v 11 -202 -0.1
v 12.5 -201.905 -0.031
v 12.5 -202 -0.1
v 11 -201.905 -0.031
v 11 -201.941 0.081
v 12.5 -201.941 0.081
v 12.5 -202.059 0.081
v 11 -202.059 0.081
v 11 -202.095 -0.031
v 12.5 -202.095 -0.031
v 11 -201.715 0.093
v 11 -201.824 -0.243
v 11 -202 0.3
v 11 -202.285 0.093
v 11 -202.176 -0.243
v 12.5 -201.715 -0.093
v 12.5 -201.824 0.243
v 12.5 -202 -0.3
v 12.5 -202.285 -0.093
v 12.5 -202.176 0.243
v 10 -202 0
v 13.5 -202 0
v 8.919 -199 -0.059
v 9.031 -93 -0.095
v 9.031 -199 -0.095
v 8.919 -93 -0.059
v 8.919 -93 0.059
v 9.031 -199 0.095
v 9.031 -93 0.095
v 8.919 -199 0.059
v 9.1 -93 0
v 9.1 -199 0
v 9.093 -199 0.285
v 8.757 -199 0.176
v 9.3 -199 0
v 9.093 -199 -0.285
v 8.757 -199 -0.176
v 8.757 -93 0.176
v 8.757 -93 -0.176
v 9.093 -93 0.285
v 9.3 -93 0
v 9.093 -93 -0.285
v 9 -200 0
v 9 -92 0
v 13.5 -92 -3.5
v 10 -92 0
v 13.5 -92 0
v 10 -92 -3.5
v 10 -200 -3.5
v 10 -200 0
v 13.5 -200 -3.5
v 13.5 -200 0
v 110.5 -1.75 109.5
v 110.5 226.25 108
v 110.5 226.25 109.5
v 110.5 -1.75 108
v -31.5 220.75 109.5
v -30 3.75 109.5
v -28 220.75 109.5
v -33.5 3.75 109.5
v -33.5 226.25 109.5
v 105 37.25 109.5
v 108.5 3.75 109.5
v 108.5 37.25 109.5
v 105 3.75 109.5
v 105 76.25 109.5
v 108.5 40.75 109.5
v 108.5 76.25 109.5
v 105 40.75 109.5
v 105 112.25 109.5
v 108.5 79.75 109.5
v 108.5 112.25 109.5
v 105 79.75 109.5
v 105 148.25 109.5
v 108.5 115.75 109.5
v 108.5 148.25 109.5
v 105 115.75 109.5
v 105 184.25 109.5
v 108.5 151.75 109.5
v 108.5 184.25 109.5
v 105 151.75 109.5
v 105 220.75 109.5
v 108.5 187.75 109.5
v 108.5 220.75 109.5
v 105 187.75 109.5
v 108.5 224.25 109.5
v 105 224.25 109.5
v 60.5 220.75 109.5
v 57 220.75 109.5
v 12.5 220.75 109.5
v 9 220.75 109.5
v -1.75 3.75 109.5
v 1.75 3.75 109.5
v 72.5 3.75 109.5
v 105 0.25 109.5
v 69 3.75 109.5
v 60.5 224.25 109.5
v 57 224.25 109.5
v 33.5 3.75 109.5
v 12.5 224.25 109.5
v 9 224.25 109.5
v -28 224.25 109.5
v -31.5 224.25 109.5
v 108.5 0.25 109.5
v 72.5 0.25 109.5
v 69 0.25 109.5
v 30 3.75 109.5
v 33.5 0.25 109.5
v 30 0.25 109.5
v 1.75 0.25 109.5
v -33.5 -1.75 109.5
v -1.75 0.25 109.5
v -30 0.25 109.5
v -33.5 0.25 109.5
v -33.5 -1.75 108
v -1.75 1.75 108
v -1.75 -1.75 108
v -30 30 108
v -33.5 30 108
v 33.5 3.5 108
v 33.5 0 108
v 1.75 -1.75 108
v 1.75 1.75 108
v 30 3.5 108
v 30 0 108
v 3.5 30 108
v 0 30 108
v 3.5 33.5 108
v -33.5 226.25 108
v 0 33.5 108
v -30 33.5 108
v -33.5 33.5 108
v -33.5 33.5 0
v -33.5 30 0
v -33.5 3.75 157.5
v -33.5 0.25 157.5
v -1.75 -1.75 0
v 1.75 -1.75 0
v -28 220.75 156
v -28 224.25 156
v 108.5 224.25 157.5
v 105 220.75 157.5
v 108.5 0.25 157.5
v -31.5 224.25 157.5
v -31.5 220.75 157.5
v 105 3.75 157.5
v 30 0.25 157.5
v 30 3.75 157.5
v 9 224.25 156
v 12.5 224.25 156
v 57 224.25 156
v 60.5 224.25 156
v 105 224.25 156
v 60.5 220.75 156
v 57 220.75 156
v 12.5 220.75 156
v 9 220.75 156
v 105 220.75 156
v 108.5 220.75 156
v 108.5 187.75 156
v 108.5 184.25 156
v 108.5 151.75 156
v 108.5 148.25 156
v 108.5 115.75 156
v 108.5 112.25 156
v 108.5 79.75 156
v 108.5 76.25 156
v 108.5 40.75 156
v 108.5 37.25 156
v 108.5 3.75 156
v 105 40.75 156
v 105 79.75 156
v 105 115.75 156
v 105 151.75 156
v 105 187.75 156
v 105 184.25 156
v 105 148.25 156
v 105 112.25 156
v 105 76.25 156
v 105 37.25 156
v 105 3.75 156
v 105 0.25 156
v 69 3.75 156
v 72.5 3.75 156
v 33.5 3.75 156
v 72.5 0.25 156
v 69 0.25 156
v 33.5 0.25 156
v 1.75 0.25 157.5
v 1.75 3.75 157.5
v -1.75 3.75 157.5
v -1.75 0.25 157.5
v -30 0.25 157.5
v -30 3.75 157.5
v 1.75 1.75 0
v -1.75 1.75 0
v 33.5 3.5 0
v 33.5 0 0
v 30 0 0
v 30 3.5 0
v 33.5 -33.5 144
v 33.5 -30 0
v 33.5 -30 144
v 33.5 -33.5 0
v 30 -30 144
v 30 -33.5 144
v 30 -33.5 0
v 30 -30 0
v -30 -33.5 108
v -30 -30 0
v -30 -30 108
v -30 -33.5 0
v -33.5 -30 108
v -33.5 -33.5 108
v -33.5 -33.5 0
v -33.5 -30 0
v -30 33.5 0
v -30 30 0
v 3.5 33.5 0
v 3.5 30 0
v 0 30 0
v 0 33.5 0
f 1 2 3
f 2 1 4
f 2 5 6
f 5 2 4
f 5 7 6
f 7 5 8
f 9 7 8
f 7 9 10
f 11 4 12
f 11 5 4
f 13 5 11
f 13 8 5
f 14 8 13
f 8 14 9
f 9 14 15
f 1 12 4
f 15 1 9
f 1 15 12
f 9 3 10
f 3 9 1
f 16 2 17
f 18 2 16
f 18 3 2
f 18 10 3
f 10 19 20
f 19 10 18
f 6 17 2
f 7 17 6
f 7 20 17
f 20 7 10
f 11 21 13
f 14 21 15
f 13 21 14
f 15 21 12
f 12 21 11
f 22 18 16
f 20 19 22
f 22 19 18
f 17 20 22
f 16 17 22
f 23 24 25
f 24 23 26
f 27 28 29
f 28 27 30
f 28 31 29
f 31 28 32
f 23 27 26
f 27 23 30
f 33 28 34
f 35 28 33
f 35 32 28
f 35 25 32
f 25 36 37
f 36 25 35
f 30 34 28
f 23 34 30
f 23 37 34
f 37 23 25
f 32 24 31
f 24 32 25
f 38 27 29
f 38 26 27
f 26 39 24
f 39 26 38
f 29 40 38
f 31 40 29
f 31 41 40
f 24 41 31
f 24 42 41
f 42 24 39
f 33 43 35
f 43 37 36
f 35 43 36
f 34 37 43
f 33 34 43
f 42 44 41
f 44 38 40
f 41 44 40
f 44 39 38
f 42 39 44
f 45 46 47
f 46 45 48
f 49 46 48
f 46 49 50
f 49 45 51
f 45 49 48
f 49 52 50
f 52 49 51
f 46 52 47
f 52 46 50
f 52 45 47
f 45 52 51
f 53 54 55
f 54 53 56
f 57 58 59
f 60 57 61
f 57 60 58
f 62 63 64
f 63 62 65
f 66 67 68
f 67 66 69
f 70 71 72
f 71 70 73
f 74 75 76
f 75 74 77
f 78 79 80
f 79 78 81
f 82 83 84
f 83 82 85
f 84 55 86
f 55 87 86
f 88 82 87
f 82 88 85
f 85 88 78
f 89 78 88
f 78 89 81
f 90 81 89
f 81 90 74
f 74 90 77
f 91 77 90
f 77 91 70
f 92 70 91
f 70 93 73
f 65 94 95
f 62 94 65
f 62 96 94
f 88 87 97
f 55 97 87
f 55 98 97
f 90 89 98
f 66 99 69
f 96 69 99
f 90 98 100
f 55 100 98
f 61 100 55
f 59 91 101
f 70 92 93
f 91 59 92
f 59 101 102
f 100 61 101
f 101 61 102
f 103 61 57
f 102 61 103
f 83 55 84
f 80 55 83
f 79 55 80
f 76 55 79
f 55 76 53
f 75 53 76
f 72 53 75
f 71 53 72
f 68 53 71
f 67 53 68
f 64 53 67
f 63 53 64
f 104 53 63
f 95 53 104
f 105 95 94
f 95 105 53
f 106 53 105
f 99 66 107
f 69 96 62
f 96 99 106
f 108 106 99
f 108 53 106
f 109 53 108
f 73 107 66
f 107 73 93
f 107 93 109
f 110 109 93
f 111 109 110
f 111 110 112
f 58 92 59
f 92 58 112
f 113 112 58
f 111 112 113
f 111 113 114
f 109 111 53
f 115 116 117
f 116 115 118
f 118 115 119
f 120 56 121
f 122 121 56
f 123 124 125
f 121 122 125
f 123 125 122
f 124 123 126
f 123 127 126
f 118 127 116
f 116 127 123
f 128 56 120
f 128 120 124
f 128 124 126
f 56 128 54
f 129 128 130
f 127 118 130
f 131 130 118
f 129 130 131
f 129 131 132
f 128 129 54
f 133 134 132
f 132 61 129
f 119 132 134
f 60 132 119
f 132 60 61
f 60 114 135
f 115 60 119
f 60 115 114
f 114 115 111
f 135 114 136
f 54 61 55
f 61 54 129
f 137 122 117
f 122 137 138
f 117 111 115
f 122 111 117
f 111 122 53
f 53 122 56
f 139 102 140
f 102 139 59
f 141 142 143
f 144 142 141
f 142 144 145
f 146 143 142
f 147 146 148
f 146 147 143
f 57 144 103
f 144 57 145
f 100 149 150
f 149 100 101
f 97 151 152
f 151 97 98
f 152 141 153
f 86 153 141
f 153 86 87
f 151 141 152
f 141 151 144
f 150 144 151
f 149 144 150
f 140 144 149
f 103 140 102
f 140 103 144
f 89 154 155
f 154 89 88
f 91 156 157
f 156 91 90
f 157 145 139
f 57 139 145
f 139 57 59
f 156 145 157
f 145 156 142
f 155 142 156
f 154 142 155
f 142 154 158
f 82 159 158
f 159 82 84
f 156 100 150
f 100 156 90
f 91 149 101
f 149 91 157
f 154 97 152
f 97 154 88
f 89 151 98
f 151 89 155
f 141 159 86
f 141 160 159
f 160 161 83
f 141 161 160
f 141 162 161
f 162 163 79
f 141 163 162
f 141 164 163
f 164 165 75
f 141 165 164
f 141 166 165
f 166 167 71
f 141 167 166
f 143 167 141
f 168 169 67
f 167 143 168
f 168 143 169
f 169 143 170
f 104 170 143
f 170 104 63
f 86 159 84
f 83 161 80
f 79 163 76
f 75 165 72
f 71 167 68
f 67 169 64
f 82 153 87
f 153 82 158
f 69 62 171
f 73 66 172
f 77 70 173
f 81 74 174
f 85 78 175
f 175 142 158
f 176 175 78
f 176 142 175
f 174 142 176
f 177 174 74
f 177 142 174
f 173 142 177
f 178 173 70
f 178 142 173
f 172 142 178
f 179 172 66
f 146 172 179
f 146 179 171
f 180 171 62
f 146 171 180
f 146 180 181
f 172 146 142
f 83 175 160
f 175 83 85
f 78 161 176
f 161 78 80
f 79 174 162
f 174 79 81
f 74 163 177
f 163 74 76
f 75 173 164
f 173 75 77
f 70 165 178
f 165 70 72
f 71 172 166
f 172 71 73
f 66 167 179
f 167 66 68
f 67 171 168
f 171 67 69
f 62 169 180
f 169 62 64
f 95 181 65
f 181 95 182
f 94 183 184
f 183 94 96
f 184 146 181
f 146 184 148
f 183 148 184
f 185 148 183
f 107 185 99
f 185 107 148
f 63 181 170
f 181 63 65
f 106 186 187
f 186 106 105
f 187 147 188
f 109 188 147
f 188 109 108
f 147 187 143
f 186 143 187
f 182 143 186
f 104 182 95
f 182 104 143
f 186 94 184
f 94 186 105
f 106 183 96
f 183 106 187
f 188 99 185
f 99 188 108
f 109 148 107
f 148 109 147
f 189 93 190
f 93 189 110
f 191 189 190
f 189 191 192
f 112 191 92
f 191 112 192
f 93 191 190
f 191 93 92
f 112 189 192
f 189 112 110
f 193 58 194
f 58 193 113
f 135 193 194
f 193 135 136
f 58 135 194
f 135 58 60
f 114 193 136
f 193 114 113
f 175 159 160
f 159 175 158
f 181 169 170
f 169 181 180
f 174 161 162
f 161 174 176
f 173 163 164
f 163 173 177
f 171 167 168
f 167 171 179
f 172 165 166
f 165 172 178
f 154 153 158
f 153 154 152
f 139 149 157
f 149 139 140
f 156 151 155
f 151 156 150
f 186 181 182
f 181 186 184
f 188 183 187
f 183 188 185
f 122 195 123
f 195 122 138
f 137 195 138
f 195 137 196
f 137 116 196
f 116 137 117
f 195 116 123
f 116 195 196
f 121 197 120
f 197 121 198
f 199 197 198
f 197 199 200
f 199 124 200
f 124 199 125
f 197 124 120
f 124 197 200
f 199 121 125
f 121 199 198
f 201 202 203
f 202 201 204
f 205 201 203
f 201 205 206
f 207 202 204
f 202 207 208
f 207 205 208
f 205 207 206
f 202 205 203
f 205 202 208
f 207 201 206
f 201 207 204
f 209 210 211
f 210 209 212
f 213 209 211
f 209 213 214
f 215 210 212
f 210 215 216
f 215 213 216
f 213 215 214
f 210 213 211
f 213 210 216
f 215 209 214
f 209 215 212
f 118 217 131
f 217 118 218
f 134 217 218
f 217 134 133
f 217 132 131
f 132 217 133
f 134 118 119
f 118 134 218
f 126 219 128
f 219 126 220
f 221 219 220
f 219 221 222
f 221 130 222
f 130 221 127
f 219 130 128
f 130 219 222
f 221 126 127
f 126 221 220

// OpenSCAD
// file: ../lib/common.scad
//--------------------------------------------------------------------------------------------------
// Module Prism
//--------------------------------------------------------------------------------------------------
module prism(z, y, x)
{
    rotate([0, 90, 0])
    {
        polyhedron(
                points=[[0,0,0], [x,0,0], [x,y,0], [0,y,0], [0,y,z], [x,y,z]],
                faces=[[0,1,2,3],[5,4,3,2],[0,4,5,1],[0,3,4],[5,2,1]]);
    }
}

//--------------------------------------------------------------------------------------------------
// Module Side panel
//--------------------------------------------------------------------------------------------------
module rect_cut(x, y, z, dx, dy)
{
    // Top panel
    translate([0, dy, 0])
    {
        cube([x, y - dy, z]);
    };

    // Left bottom panel
    translate([0, 0, 0])
    {
        cube([dx, dy, z]);
    };

    // Triangle
    translate([dx, 0, 0])
    {
        rotate([0, 0, 0])
        {
            prism(x - dx, dy, -z);
        }
    };
}

//--------------------------------------------------------------------------------------------------
// X dimensional arrow
//--------------------------------------------------------------------------------------------------
module arrow_x(l)
{
    line_w = 0.1;
    arrow_w = 1;
    arrow_h = 0.3;

    // Line
    translate([l / 2, 0, 0])
    {
        rotate([0, 90, 0])
        {
            color([0.4, 0.4, 0.4])
            cylinder(l - arrow_w * 2, line_w, line_w, true);
        }
    }

    // Left arrow
    translate([arrow_w, 0, 0])
    {
        rotate([0, 270, 0])
        {
            color([0.4, 0.4, 0.4])
            cylinder(arrow_w, arrow_h, 0, false);
        }
    }

    // Right arrow
    translate([l - arrow_w, 0, 0])
    {
        rotate([0, 90, 0])
        {
            color([0.4, 0.4, 0.4])
            cylinder(arrow_w, arrow_h, 0, false);
        }
    }

    // Text
    translate([l/3, 0.5, 0])
    {
        color([0.4, 0.4, 0.4])
        text(str(l), size=1);
    }
}

//--------------------------------------------------------------------------------------------------
// Y dimensional arrow
//--------------------------------------------------------------------------------------------------
module arrow_y(l)
{
    line_w = 0.1;
    arrow_w = 1;
    arrow_h = 0.3;

    // Line
    translate([0, l / 2, 0])
    {
        rotate([90, 0, 00])
        {
            color([0.4, 0.4, 0.4])
            cylinder(l - arrow_w * 2, line_w, line_w, true);
        }
    }

    // Left arrow
    translate([0 ,arrow_w, 0])
    {
        rotate([90, 0, 0])
        {
            color([0.4, 0.4, 0.4])
            cylinder(arrow_w, arrow_h, 0, false);
        }
    }

    // Right arrow
    translate([0, l - arrow_w, 0])
    {
        rotate([270, 0, 0])
        {
            color([0.4, 0.4, 0.4])
            cylinder(arrow_w, arrow_h, 0, false);
        }
    }

    // Text
    translate([-0.5, l/3, 0])
    {
        rotate([0 ,0, 90])
        {
            color([0.4, 0.4, 0.4])
            text(str(l), size=1);
        }
    }
}

//--------------------------------------------------------------------------------------------------
// Z dimensional arrow
//--------------------------------------------------------------------------------------------------
module arrow_z(l)
{
    line_w = 0.11;
    arrow_w = 1;
    arrow_h = 0.3;

    // Line
    translate([0, 0, l / 2])
    {
        rotate([0, 0, 0])
        {
            color([0.4, 0.4, 0.4])
            cylinder(l - arrow_w * 2, line_w, line_w, true);
        }
    }

    // Left arrow
    translate([0, 0, arrow_w])
    {
        rotate([0, 180, 0])
        {
            color([0.4, 0.4, 0.4])
            cylinder(arrow_w, arrow_h, 0, false);
        }
    }

    // Right arrow
    translate([0, 0, l - arrow_w])
    {
        rotate([0, 0, 0])
        {
            color([0.4, 0.4, 0.4])
            cylinder(arrow_w, arrow_h, 0, false);
        }
    }

    // Text
    translate([0.5, 0, l/3])
    {
        rotate([90 ,0, 90])
        {
            color([0.4, 0.4, 0.4])
            text(str(l), size=1);
        }
    }
}

//--------------------------------------------------------------------------------------------------
// parallelogram
//--------------------------------------------------------------------------------------------------
module parallelogram(x = 12, y = 12, z = 1, xd = 0)
{
    points = [
        [0, 0, 0 ],        //0
        [x, 0, 0 ],        //1
        [x + xd, y, 0],    //2
        [xd, y, 0 ],       //3
        [0, 0, z ],        //4
        [x, 0, z ],        //5
        [x + xd, y, z ],   //6
        [xd, y, z ]];      //7

    faces = [
        [0,1,2,3],         // bottom
        [4,5,1,0],         // front
        [7,6,5,4],         // top
        [5,6,2,1],         // right
        [6,7,3,2],         // back
        [7,4,0,3]];        // left

    polyhedron(points, faces);
}

//--------------------------------------------------------------------------------------------------
// common board
//--------------------------------------------------------------------------------------------------
module board(w, h, d, r, g, b)
{
    color([r, g, b])
    cube([w, h, d]);
}

//--------------------------------------------------------------------------------------------------
// board dimension
//--------------------------------------------------------------------------------------------------
module dimension(w, h, d, r, g, b, part_x, part_y)
{
    translate([part_x, -part_y, 0])
    {
        rotate([-90, 0, 0])
        {
            board(w, h, d, r, g, b);
        }
            
        translate([0, -2, 0])
        {
            color([0, 0, 0])
            arrow_x(w);
        };

        translate([-1, 0, 0])
        {
            color([0, 0, 0])
            arrow_y(d);
        };
    }
}
// main file
include <../lib/common.scad>

PartY = 200;
StairHeight = 8.2;
StairWidth = 30;
Thick = 1.5;
PoleThick = 3.5;


//------------------------------------------------------------------------------
// Render
//------------------------------------------------------------------------------

// Post 1
translate([-PoleThick / 2, -PoleThick / 2, 0])
{
    board(PoleThick, PoleThick, 9 * 12, 0.5, 0.5, 0);
}
dimension(PoleThick, PoleThick, 9 * 12, 0.5, 0.5, 0, 10, PartY);

translate([StairWidth, 0, 0])
{
    board(PoleThick, PoleThick, 9 * 12, 0.5, 0.5, 0);
}

translate([StairWidth, -PoleThick - StairWidth, 0])
{
    board(PoleThick, PoleThick, 12 * 12, 0.5, 0.5, 0);
}

translate([-StairWidth - PoleThick, -PoleThick -StairWidth, 0])
{
    board(PoleThick, PoleThick, 9 * 12, 0.5, 0.5, 0);
}

translate([-PoleThick - StairWidth, StairWidth, 0])
{
    board(PoleThick, PoleThick, 9 * 12, 0.5, 0.5, 0);
}

translate([0, StairWidth, 0])
{
    board(PoleThick, PoleThick, 9 * 12, 0.5, 0.5, 0);
}

// stair board
// 1 -------------2
// |              |  
// 0 ------------ 3
//
// (x0, y0, x1, y1, x2, y2, x3, y3, z)
module stair_board(x0, y0, x1, y1, x2, y2, x3, y3, z)
{
    polyhedron(
        points=[[x0,y0,0], [x1,y1,0], [x2,y2,0], [x3,y3,0], [x0,y0,z], [x1,y1,z], [x2,y2,z], [x3,y3,z]],
        faces=[[0,1,2], [0,2,3],[0,4,3],[4,7,3],[0,1,5],[0,4,5],[1,2,6],[1,6,5],[2,3,7],[2,7,6],[4,5,6],[4,6,7]]);
}

module stair_dimension(w, d)
{
    translate([part_x, -part_y, 0])
    {
        translate([0, -2, 0])
        {
            color([0, 0, 0])
            arrow_x(w);
        };

        translate([-1, 0, 0])
        {
            color([0, 0, 0])
            arrow_y(d);
        };
    }
}

// Stair 1
translate([0, -15, 12 * 9 - Thick - StairHeight])
{
    rotate([0, 0, 0])
    {
        color([0, 0.4, 0.4])
        stair_board(PoleThick / 2, 15 - PoleThick / 2, PoleThick / 2, 15 + PoleThick / 2, StairWidth + Thick, 15, StairWidth  + Thick, 0, 1.5);
    }
}

// Stair 2
translate([0, -15, 12 * 9 - Thick - StairHeight * 2])
{
    rotate([0, 0, 0])
    {
        color([0, 0.4, 0.4])
        stair_board(PoleThick / 2, 15 - PoleThick / 2, PoleThick / 2, 15 + PoleThick / 2, StairWidth + Thick, 0, StairWidth + Thick, -15, 1.5);
    }
}

// Stair 3
translate([0, 0, 12 * 9 - Thick - StairHeight * 3])
{
    rotate([0, 0, -90])
    {
        color([0.4, 0.4, 0.4])
        stair_board(PoleThick / 2, -PoleThick / 2, PoleThick / 2, PoleThick / 2, StairWidth + Thick, 30, StairWidth + Thick, 15, 1.5);
    }
}

// Stair 4
translate([0, 0, 12 * 9 - Thick - StairHeight * 4])
{
    rotate([0, 0, -90])
    {
        color([0.4, 0.4, 0.4])
        stair_board(PoleThick / 2, -PoleThick / 2, PoleThick / 2, PoleThick / 2, StairWidth + Thick, 15, StairWidth + Thick, 0, 1.5);
    }
}

// Stair 5
translate([-15, 0, 12 * 9 - Thick - StairHeight * 5])
{
    rotate([0, 0, -90])
    {
        color([0.4, 0.4, 0.4])
        stair_board(PoleThick / 2, 15 - PoleThick / 2, PoleThick / 2, 15 + PoleThick / 2, StairWidth + Thick, 15, StairWidth + Thick, 0, 1.5);
    }
}

// Stair 6
translate([-15, 0, 12 * 9 - Thick - StairHeight * 6])
{
    rotate([0, 0, -90])
    {
        color([0.4, 0.4, 0.4])
        stair_board(PoleThick / 2, 15 - PoleThick / 2, PoleThick / 2, 15 + PoleThick / 2, StairWidth + Thick, 0, StairWidth + Thick, -15, 1.5);
    }
}

// Stair 7
translate([0, 0, 12 * 9 - Thick - StairHeight * 7])
{
    rotate([0, 0, -180])
    {
        color([0, 0.4, 0.9])
        stair_board(PoleThick / 2, -PoleThick / 2, PoleThick / 2, PoleThick / 2, StairWidth + Thick, 30, StairWidth + Thick, 15, 1.5);
    }
}

// Stair 8
translate([0, 0, 12 * 9 - Thick - StairHeight * 8])
{
    rotate([0, 0, -180])
    {
        color([0, 0.4, 0.9])
        stair_board(PoleThick / 2, -PoleThick / 2, PoleThick / 2, PoleThick / 2, StairWidth + Thick, 15, StairWidth + Thick, 0, 1.5);
    }
}

// Stair 9
translate([0, 0, 12 * 9 - Thick - StairHeight * 9])
{
    rotate([0, 0, -180])
    {
        color([0, 0.4, 0.9])
        stair_board(PoleThick / 2, -PoleThick / 2, PoleThick / 2, PoleThick / 2, StairWidth + Thick, 0, StairWidth + Thick, -15, 1.5);
    }
}

// Stair 10
translate([0, 0, 12 * 9 - Thick - StairHeight * 10])
{
    rotate([0, 0, -180])
    {
        color([0, 0.4, 0.9])
        stair_board(PoleThick / 2, -PoleThick / 2, PoleThick / 2, PoleThick / 2, StairWidth + Thick, -15, StairWidth + Thick, -30, 1.5);
    }
}

// Stair 11
translate([0, 0, 12 * 9 - Thick - StairHeight * 11])
{
    rotate([0, 0, -270])
    {
        color([0, 0.4, 0.4])
        stair_board(PoleThick / 2, -PoleThick / 2, PoleThick / 2, PoleThick / 2, StairWidth + Thick, 30, StairWidth + Thick, 15, 1.5);
    }
}

// Stair 11
translate([0, 0, 12 * 9 - Thick - StairHeight * 12])
{
    rotate([0, 0, -270])
    {
        color([0, 0.4, 0.4])
        stair_board(PoleThick / 2, -PoleThick / 2, PoleThick / 2, PoleThick / 2, StairWidth + Thick, 15, StairWidth + Thick, 0, 1.5);
    }
}

// Stair base 1
translate([30, -30, 12 * 9 - StairHeight * 2])
{
    rotate([90, 0, 90])
    {
        color([1, 0.4, 0.4])
        stair_board(0, 0, 0, 6.7, StairWidth, 6.7, StairWidth, 0, 1.5);
    }
}

translate([30, -30, 12 * 9 - StairHeight * 3])
{
    rotate([90, 0, 90])
    {
        color([1, 0.4, 0.4])
        stair_board(0, 0, 0, 6.7, StairWidth, 6.7, StairWidth, 0, 1.5);
    }
}

// Stair base 2
translate([StairWidth, -StairWidth - Thick, 12 * 9 - StairHeight * 4])
{
    rotate([90, 0, 180])
    {
        color([0.7, 0.4, 0.7])
        stair_board(0, 0, 0, 6.7, StairWidth * 2, 6.7, StairWidth * 2, 0, 1.5);
    }
}

translate([StairWidth, -StairWidth - Thick, 12 * 9 - StairHeight * 5])
{
    rotate([90, 0, 180])
    {
        color([0.7, 0.4, 0.7])
        stair_board(0, 0, 0, 6.7, StairWidth * 2, 6.7, StairWidth * 2, 0, 1.5);
    }
}

translate([StairWidth, -StairWidth - Thick, 12 * 9 - StairHeight * 6])
{
    rotate([90, 0, 180])
    {
        color([0.7, 0.4, 0.7])
        stair_board(0, 0, 0, 6.7, StairWidth * 2, 6.7, StairWidth * 2, 0, 1.5);
    }
}

translate([StairWidth, -StairWidth - Thick, 12 * 9 - StairHeight * 7])
{
    rotate([90, 0, 180])
    {
        color([0.7, 0.4, 0.7])
        stair_board(0, 0, 0, 6.7, StairWidth * 2, 6.7, StairWidth * 2, 0, 1.5);
    }
}

// Stair base 3
translate([-StairWidth, StairWidth, 12 * 9 - StairHeight * 8])
{
    rotate([90, 0, 270])
    {
        color([0.7, 0.9, 0.7])
        stair_board(0, 0, 0, 6.7, StairWidth * 2, 6.7, StairWidth * 2, 0, 1.5);
    }
}

translate([-StairWidth, StairWidth, 12 * 9 - StairHeight * 9])
{
    rotate([90, 0, 270])
    {
        color([0.7, 0.9, 0.7])
        stair_board(0, 0, 0, 6.7, StairWidth * 2, 6.7, StairWidth * 2, 0, 1.5);
    }
}

translate([-StairWidth, StairWidth, 12 * 9 - StairHeight * 10])
{
    rotate([90, 0, 270])
    {
        color([0.7, 0.9, 0.7])
        stair_board(0, 0, 0, 6.7, StairWidth * 2, 6.7, StairWidth * 2, 0, 1.5);
    }
}

translate([-StairWidth, StairWidth, 12 * 9 - StairHeight * 11])
{
    rotate([90, 0, 270])
    {
        color([0.7, 0.9, 0.7])
        stair_board(0, 0, 0, 6.7, StairWidth * 2, 6.7, StairWidth * 2, 0, 1.5);
    }
}

// Stair base 4
translate([-StairWidth, StairWidth + Thick, 12 * 9 - StairHeight * 12])
{
    rotate([90, 0, 0])
    {
        color([1, 0.4, 0.4])
        stair_board(0, 0, 0, 6.7, StairWidth, 6.7, StairWidth, 0, 1.5);
    }
}

translate([-StairWidth, StairWidth + Thick, 12 * 9 - StairHeight * 13])
{
    rotate([90, 0, 0])
    {
        color([1, 0.4, 0.4])
        stair_board(0, 0, 0, 6.7, StairWidth, 6.7, StairWidth, 0, 1.5);
    }
}


// deck

translate([-33.5, -3.5 / 2, 0])
{
    translate([0, 0, 12 * 9])
    {
        color([1, 1, 0])
        board(12 * 12, 12 * 19
        , 1.5, 1, 0, 0);
    }

    // Deck Post
    translate([2, 12 * 19 - 3.5 - 2, 12 * 9 + 1.5])
    {
        board(3.5, 3.5, 12 * 4, 0.5, 0.7, 1);
    }

    translate([12 * 4 - 3.5 - 2, 12 * 19 - 3.5 - 2, 12 * 9 + 1.5])
    {
        board(3.5, 3.5, 12 * 4, 0.5, 0.7, 1);
    }

    translate([12 * 8 - 3.5 - 2, 12 * 19 - 3.5 - 2, 12 * 9 + 1.5])
    {
        board(3.5, 3.5, 12 * 4, 0.5, 0.7, 1);
    }

    translate([12 * 12 - 3.5 - 2, 12 * 19 - 3.5 - 2, 12 * 9 + 1.5])
    {
        board(3.5, 3.5, 12 * 4, 0.5, 0.7, 1);
    }

    translate([12 * 12 - 3.5 - 2, 12 * 15.5, 12 * 9 + 1.5])
    {
        board(3.5, 3.5, 12 * 4, 0.5, 0.7, 1);
    }

    translate([12 * 12 - 3.5 - 2, 12 * 12.5, 12 * 9 + 1.5])
    {
        board(3.5, 3.5, 12 * 4, 0.5, 0.7, 1);
    }

    translate([12 * 12 - 3.5 - 2, 12 * 9.5, 12 * 9 + 1.5])
    {
        board(3.5, 3.5, 12 * 4, 0.5, 0.7, 1);
    }

    translate([12 * 12 - 3.5 - 2, 12 * 6.5, 12 * 9 + 1.5])
    {
        board(3.5, 3.5, 12 * 4, 0.5, 0.7, 1);
    }

    translate([12 * 12 - 3.5 - 2, 12 * 3.25, 12 * 9 + 1.5])
    {
        board(3.5, 3.5, 12 * 4, 0.5, 0.7, 1);
    }

    translate([12 * 12 - 3.5 - 2, 2, 12 * 9 + 1.5])
    {
        board(3.5, 3.5, 12 * 4, 0.5, 0.7, 1);
    }

    translate([12 * 9 - 3.5 - 2, 2, 12 * 9 + 1.5])
    {
        board(3.5, 3.5, 12 * 4, 0.5, 0.7, 1);
    }

    translate([63.5, 2, 12 * 9 + 1.5])
    {
        board(3.5, 3.5, 12 * 4, 0.5, 0.7, 1);
    }

    translate([30 + 3.5 / 2, 2, 12 * 9 + 1.5])
    {
        board(3.5, 3.5, 12 * 4, 0.5, 0.7, 1);
    }

    translate([0, 2, 12 * 9 + 1.5])
    {
        board(3.5, 3.5, 12 * 4, 0.5, 0.7, 1);
    }

    // Deck Rails
    translate([12 * 12 - 3.5 - 2, 2, 12 * 13])
    {
        color([1, 0.6, 0.2])
        board(3.5, 12 * 18 + 8, 1.5, 1, 0, 0);
    }

    translate([2, 12 * 19 - 2, 12 * 13])
    {
        rotate([0, 0, -90])
        {
            color([1, 0, 1])
            board(3.5, 12 * 11 + 8, 1.5, 1, 0, 0);
        }
    }

    translate([33.5 * 2, 3.5 + 2, 12 * 13])
    {
        rotate([0, 0, -90])
        {
            color([1, 0, 1])
            board(3.5, 12 * 6 + 0.5 , 1.5, 1, 0, 0);
        }
    }

}


/*
Wire:
12 ft * 10 * 2 = 240 ft
19Ft * 10 = 190 ft
450 ft
76 + 63 = 139 = 150ft

* Wire 600 ft : $45.99 (400ft) X 2 = $92
https://www.amazon.com/gp/product/B08DFPK92T/ref=ox_sc_act_title_1?smid=AWBF18OIWWCF7&psc=1

* End(CR23) : 40
4" : $35.99 (40) 
https://www.amazon.com/Muzata-Threaded-Terminal-Fitting-Stainless/dp/B07X69BWBY/ref=sr_1_17?dchild=1&keywords=Muzata%2BCR30&qid=1607473682&sr=8-17&th=1

6" : $19.99 (10)
https://www.amazon.com/Threaded-Tension-Terminal-Stainless-CR39/dp/B07RDHNWG6/ref=sr_1_9?dchild=1&keywords=Muzata+CR30&qid=1607473583&sr=8-9

* Dead End(CR24) : 40
$34.99 X 2 (40) = $69.98
https://www.amazon.com/Muzata-Stainless-handcrimp-Stemball-Railing/dp/B078H4W8GZ/ref=sr_1_1_sspa?dchild=1&keywords=Muzata+CR24&qid=1605090029&sr=8-1-spons&psc=1&spLa=ZW5jcnlwdGVkUXVhbGlmaWVyPUExSklSR1Y1OVFGRVZYJmVuY3J5cHRlZElkPUEwODc3NzgxMU9QUVBDM0pGTkFHOCZlbmNyeXB0ZWRBZElkPUEwODIwNjU1M0JIOU5GTkFTRUpZUSZ3aWRnZXROYW1lPXNwX2F0ZiZhY3Rpb249Y2xpY2tSZWRpcmVjdCZkb05vdExvZ0NsaWNrPXRydWU=

* Corner 45 Degree: 40 : $45.99
https://www.amazon.com/CKE-Stainless-Beveled-Protector-Sleeves/dp/B08DTV1FC1/ref=sr_1_4_sspa?dchild=1&keywords=CKE&qid=1605088202&sr=8-4-spons&psc=1&spLa=ZW5jcnlwdGVkUXVhbGlmaWVyPUFLQzJWSlpKNlk0TkgmZW5jcnlwdGVkSWQ9QTAwNjQ4NjEzN1lOVUJORE5LSTNIJmVuY3J5cHRlZEFkSWQ9QTAwNDI3NjEyN0dHWk5GMU1PNUNGJndpZGdldE5hbWU9c3BfYXRmJmFjdGlvbj1jbGlja1JlZGlyZWN0JmRvTm90TG9nQ2xpY2s9dHJ1ZQ==

* Protector Sleeves: 220

$39.99 X 2 = $79.98 : 200
https://www.amazon.com/Muzata-Stainless-Protective-Balustrade-CR13/dp/B07426BBKH?ref_=ast_sto_dp

$17.99 : 40
https://www.amazon.com/Muzata-Stainless-Protective-Balustrade-CK16/dp/B07JN2D5KV?ref_=ast_sto_dp

* 30 Degree Angled Beveled Washer : 40
$45.99 : 50
https://www.amazon.com/Professional-Stainless-Balustrade-Railings-Aluminum/dp/B082YQYHQB/ref=sr_1_13_sspa?dchild=1&keywords=Angle+Beveled+Washer+for+1%2F8%22&qid=1607475095&s=hi&sr=1-13-spons&psc=1&spLa=ZW5jcnlwdGVkUXVhbGlmaWVyPUExVlo0N1A5SkdBTTJHJmVuY3J5cHRlZElkPUEwNzM4MDkxMTNBOExKMElPSURJSSZlbmNyeXB0ZWRBZElkPUEwMTA2NTk2M0s4SVlSU0M1U1Q2OSZ3aWRnZXROYW1lPXNwX210ZiZhY3Rpb249Y2xpY2tSZWRpcmVjdCZkb05vdExvZ0NsaWNrPXRydWU=

* Tool
Hydraulic Cable Crimper: $56.98
https://www.amazon.com/Goplus-Hydraulic-Crimper-Terminal-Crimping/dp/B00ZA2P3XM/ref=sr_1_7?dchild=1&keywords=Hydraulic+Cable+Crimper&qid=1607475871&s=hi&sr=1-7

Drill guide: 
30 & 45 : 29.99 X 2 = $59.98
https://www.amazon.com/Muzata-Installation-Horizontal-Drilling-Template/dp/B083Q8K2N5/ref=sr_1_4?dchild=1&keywords=30%2Bdegree%2Bdrill%2Bguide&qid=1607476940&s=hi&sr=1-4&th=1


*/
